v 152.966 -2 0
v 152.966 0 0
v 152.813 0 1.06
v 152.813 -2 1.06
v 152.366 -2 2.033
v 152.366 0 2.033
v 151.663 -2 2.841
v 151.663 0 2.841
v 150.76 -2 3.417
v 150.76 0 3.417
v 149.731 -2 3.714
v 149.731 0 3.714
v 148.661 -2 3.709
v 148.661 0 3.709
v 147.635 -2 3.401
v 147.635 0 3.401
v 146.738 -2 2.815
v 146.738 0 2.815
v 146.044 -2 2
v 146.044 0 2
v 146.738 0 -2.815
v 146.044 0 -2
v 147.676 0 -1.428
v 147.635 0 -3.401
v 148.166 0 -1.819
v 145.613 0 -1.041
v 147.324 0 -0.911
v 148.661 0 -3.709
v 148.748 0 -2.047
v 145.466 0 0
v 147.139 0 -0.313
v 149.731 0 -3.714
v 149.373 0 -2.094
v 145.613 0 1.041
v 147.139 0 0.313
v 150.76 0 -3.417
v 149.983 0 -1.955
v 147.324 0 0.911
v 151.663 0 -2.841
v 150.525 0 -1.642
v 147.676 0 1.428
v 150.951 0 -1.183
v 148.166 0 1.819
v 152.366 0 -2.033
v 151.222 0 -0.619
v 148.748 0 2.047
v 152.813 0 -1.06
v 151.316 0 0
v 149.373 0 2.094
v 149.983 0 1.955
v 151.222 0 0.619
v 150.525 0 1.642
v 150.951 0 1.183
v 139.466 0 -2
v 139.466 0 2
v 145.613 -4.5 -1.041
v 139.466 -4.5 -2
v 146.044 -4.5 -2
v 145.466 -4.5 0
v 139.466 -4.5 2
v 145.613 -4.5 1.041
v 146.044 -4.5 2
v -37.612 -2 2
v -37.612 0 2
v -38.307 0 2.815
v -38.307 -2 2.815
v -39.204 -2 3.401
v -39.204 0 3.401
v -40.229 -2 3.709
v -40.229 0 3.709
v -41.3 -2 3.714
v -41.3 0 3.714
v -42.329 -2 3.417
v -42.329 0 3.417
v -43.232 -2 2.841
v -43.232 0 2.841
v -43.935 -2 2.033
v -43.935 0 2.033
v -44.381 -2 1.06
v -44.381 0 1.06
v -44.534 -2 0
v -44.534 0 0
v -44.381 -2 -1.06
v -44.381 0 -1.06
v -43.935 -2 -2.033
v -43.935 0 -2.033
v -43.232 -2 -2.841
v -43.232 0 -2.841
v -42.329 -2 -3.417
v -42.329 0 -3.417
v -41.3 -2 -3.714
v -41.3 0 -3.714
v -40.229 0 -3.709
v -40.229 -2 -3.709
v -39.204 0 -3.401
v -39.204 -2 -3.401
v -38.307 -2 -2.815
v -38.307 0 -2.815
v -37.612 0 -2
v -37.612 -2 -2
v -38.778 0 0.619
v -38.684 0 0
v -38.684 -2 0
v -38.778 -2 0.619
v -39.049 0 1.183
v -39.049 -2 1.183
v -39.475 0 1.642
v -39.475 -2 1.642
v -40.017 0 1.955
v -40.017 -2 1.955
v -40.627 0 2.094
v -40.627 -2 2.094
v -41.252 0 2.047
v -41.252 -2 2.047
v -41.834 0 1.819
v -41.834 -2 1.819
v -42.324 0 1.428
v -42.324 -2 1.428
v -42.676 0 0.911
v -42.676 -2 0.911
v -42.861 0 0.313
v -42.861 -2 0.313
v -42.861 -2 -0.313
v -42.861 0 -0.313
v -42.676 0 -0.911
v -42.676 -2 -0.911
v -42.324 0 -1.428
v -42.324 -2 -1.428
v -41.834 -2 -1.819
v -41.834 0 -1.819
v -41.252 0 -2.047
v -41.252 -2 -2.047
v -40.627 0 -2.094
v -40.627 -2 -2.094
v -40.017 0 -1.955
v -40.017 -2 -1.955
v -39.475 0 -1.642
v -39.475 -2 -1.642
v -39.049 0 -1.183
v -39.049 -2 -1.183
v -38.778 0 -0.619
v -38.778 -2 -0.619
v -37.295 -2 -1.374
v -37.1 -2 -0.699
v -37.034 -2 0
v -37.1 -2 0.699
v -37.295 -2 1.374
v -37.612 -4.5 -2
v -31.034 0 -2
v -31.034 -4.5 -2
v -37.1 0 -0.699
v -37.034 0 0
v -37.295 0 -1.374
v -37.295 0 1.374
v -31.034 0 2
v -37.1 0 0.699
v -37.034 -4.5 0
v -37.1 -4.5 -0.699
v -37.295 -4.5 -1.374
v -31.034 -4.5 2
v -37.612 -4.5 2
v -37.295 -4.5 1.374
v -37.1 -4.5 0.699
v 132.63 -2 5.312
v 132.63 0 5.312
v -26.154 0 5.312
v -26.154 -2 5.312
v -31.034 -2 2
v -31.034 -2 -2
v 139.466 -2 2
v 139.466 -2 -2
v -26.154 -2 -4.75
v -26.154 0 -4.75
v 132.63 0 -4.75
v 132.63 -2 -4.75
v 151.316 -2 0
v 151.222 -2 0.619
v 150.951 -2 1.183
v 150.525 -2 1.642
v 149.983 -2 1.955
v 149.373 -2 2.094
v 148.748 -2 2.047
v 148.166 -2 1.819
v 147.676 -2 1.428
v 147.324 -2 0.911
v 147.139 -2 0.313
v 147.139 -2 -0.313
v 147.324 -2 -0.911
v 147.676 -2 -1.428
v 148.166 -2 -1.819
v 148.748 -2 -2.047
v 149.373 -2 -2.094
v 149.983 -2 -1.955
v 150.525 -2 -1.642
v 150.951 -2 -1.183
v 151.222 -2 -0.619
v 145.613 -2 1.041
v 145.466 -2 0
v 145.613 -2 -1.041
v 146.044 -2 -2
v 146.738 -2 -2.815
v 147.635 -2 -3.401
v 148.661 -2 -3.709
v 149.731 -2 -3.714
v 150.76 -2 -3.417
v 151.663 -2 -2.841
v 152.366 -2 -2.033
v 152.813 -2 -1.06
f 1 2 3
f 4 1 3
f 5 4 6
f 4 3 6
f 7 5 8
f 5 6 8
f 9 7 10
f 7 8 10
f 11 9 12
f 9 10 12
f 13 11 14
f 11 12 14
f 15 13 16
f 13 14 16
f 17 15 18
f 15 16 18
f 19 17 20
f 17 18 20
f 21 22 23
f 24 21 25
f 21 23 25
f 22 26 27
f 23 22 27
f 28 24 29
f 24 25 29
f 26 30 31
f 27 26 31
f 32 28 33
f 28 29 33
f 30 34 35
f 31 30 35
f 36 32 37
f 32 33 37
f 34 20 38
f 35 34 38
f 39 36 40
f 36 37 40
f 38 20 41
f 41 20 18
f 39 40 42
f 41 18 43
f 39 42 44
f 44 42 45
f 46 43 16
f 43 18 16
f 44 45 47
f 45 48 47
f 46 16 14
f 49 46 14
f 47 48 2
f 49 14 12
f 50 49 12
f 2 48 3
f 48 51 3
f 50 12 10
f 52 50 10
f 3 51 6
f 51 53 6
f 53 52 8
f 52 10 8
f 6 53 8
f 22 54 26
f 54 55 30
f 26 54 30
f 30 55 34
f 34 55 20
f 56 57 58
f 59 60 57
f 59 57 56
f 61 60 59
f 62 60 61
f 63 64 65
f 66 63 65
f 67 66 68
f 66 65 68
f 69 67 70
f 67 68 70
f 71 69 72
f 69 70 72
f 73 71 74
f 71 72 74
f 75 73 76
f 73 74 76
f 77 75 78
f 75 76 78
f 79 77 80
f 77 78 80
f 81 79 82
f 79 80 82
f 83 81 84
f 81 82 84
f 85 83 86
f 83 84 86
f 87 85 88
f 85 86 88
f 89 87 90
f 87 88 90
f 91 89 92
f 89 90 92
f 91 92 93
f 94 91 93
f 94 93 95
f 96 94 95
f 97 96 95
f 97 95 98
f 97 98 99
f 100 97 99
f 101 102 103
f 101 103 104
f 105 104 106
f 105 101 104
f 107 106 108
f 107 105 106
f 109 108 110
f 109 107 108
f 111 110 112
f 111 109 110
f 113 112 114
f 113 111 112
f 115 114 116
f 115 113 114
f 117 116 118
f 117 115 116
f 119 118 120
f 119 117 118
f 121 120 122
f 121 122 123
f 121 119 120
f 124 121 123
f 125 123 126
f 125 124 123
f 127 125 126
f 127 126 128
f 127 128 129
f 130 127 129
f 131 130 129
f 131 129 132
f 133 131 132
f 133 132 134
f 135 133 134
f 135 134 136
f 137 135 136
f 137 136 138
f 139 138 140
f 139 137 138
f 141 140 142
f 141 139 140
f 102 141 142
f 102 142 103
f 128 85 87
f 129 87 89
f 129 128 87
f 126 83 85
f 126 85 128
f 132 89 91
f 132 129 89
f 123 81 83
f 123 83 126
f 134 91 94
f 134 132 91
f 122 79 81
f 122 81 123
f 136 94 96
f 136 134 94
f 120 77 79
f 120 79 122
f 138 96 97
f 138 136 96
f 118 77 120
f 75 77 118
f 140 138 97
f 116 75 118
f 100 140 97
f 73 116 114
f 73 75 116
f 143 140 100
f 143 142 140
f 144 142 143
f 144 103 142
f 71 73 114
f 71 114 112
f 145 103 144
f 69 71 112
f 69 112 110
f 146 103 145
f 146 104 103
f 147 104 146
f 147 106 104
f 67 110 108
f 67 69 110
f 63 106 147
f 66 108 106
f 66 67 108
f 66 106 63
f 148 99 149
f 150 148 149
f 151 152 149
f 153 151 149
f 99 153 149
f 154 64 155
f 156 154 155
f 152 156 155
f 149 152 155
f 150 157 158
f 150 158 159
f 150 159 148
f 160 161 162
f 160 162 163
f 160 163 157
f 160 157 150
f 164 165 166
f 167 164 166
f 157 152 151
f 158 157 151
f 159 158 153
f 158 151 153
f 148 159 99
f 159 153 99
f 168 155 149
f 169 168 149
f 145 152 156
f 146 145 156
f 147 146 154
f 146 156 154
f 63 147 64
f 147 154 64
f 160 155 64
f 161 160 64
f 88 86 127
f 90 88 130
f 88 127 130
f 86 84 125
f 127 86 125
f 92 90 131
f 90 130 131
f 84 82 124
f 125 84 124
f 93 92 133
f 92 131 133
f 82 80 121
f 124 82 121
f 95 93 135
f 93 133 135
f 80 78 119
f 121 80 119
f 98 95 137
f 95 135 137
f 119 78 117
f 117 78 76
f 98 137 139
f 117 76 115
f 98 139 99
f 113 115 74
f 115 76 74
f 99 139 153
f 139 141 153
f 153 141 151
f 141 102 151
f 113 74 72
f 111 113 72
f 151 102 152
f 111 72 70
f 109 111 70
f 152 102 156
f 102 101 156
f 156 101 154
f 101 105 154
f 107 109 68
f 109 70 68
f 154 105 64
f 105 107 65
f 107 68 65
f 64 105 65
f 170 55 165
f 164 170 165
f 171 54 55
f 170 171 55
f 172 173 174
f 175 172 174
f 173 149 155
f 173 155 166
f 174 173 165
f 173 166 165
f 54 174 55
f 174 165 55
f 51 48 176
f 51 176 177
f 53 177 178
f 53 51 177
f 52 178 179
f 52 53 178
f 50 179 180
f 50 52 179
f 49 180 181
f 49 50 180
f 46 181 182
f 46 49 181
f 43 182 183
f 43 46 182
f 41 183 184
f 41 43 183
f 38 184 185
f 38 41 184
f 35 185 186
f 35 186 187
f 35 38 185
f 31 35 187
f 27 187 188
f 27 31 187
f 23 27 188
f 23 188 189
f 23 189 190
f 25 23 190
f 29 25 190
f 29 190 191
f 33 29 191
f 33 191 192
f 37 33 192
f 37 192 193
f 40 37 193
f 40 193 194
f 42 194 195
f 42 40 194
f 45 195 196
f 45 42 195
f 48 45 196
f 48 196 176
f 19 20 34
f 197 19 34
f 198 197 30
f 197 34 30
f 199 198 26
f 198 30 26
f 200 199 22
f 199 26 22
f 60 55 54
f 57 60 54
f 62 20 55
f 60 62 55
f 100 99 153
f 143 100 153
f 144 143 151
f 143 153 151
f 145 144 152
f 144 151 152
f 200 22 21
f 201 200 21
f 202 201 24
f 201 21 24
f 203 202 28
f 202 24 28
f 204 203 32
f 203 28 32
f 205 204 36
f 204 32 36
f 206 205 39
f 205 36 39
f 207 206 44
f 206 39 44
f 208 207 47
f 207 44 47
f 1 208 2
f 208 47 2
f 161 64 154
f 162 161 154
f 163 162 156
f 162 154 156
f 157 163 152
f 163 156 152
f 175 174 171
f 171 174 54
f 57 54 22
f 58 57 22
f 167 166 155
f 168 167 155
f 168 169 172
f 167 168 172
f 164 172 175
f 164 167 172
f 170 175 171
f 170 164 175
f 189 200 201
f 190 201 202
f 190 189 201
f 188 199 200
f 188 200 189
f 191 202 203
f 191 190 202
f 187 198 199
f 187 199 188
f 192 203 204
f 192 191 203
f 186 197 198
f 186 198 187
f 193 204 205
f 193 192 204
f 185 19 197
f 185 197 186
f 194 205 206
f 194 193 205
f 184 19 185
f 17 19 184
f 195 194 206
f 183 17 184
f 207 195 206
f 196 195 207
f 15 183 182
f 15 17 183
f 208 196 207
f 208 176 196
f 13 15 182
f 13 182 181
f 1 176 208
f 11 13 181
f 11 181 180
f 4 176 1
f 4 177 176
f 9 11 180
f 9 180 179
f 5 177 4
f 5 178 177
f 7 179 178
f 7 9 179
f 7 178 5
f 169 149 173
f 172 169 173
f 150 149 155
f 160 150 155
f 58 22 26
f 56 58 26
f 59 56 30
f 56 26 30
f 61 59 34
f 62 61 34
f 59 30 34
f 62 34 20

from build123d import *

# Parameters (mm, degrees)
F0_R     = 2.1
F1_DEPTH = 2
F2_DEPTH = 4.5
F3_DEPTH = 2


with BuildPart() as f1:
    # F0 (on Front) → F1 (new body)
    with BuildSketch(Plane.XZ):
        with BuildLine():
            ThreePointArc((-37.612203, -2), (-37.181707, -1.040903), (-37.034348, 0))
            ThreePointArc((-37.034348, 0), (-37.181707, 1.040903), (-37.612203, 2))
            ThreePointArc((-37.612203, 2), (-44.534348, 0), (-37.612203, -2))
        make_face()
        with Locations((-40.784348, 0)):
            Circle(F0_R, mode=Mode.SUBTRACT)
        with BuildLine():
            ThreePointArc((152.965652, 0), (150.256555, 3.602641), (146.043508, 2))
            ThreePointArc((146.043508, 2), (145.465652, 0), (146.043508, -2))
            ThreePointArc((146.043508, -2), (150.256555, -3.602641), (152.965652, 0))
        make_face()
        with Locations((149.215652, 0)):
            Circle(F0_R, mode=Mode.SUBTRACT)
    extrude(amount=F1_DEPTH)


with BuildPart() as f2:
    # F0 (on Front) → F2 (new body)
    with BuildSketch(Plane.XZ):
        with BuildLine():
            Line((146.043508, 2), (139.465652, 2))
            Line((139.465652, 2), (139.465652, -2))
            Line((139.465652, -2), (146.043508, -2))
            ThreePointArc((146.043508, -2), (145.465652, 0), (146.043508, 2))
        make_face()
        with BuildLine():
            ThreePointArc((-37.612203, 2), (-37.181707, 1.040903), (-37.034348, 0))
            ThreePointArc((-37.034348, 0), (-37.181707, -1.040903), (-37.612203, -2))
            Line((-37.612203, -2), (-31.034348, -2))
            Line((-31.034348, -2), (-31.034348, 2))
            Line((-31.034348, 2), (-37.612203, 2))
        make_face()
    extrude(amount=F2_DEPTH)


with BuildPart() as f3:
    # F0 (on Front) → F3 (new body)
    with BuildSketch(Plane.XZ):
        Polygon((-26.1539, 5.312169), (-31.034348, 2), (-31.034348, -2), (-26.1539, -4.749664), (132.63008, -4.749664), (139.465652, -2), (139.465652, 2), (132.63008, 5.312169), align=None)
    extrude(amount=F3_DEPTH)


solid = Compound([f1.part, f2.part, f3.part])
